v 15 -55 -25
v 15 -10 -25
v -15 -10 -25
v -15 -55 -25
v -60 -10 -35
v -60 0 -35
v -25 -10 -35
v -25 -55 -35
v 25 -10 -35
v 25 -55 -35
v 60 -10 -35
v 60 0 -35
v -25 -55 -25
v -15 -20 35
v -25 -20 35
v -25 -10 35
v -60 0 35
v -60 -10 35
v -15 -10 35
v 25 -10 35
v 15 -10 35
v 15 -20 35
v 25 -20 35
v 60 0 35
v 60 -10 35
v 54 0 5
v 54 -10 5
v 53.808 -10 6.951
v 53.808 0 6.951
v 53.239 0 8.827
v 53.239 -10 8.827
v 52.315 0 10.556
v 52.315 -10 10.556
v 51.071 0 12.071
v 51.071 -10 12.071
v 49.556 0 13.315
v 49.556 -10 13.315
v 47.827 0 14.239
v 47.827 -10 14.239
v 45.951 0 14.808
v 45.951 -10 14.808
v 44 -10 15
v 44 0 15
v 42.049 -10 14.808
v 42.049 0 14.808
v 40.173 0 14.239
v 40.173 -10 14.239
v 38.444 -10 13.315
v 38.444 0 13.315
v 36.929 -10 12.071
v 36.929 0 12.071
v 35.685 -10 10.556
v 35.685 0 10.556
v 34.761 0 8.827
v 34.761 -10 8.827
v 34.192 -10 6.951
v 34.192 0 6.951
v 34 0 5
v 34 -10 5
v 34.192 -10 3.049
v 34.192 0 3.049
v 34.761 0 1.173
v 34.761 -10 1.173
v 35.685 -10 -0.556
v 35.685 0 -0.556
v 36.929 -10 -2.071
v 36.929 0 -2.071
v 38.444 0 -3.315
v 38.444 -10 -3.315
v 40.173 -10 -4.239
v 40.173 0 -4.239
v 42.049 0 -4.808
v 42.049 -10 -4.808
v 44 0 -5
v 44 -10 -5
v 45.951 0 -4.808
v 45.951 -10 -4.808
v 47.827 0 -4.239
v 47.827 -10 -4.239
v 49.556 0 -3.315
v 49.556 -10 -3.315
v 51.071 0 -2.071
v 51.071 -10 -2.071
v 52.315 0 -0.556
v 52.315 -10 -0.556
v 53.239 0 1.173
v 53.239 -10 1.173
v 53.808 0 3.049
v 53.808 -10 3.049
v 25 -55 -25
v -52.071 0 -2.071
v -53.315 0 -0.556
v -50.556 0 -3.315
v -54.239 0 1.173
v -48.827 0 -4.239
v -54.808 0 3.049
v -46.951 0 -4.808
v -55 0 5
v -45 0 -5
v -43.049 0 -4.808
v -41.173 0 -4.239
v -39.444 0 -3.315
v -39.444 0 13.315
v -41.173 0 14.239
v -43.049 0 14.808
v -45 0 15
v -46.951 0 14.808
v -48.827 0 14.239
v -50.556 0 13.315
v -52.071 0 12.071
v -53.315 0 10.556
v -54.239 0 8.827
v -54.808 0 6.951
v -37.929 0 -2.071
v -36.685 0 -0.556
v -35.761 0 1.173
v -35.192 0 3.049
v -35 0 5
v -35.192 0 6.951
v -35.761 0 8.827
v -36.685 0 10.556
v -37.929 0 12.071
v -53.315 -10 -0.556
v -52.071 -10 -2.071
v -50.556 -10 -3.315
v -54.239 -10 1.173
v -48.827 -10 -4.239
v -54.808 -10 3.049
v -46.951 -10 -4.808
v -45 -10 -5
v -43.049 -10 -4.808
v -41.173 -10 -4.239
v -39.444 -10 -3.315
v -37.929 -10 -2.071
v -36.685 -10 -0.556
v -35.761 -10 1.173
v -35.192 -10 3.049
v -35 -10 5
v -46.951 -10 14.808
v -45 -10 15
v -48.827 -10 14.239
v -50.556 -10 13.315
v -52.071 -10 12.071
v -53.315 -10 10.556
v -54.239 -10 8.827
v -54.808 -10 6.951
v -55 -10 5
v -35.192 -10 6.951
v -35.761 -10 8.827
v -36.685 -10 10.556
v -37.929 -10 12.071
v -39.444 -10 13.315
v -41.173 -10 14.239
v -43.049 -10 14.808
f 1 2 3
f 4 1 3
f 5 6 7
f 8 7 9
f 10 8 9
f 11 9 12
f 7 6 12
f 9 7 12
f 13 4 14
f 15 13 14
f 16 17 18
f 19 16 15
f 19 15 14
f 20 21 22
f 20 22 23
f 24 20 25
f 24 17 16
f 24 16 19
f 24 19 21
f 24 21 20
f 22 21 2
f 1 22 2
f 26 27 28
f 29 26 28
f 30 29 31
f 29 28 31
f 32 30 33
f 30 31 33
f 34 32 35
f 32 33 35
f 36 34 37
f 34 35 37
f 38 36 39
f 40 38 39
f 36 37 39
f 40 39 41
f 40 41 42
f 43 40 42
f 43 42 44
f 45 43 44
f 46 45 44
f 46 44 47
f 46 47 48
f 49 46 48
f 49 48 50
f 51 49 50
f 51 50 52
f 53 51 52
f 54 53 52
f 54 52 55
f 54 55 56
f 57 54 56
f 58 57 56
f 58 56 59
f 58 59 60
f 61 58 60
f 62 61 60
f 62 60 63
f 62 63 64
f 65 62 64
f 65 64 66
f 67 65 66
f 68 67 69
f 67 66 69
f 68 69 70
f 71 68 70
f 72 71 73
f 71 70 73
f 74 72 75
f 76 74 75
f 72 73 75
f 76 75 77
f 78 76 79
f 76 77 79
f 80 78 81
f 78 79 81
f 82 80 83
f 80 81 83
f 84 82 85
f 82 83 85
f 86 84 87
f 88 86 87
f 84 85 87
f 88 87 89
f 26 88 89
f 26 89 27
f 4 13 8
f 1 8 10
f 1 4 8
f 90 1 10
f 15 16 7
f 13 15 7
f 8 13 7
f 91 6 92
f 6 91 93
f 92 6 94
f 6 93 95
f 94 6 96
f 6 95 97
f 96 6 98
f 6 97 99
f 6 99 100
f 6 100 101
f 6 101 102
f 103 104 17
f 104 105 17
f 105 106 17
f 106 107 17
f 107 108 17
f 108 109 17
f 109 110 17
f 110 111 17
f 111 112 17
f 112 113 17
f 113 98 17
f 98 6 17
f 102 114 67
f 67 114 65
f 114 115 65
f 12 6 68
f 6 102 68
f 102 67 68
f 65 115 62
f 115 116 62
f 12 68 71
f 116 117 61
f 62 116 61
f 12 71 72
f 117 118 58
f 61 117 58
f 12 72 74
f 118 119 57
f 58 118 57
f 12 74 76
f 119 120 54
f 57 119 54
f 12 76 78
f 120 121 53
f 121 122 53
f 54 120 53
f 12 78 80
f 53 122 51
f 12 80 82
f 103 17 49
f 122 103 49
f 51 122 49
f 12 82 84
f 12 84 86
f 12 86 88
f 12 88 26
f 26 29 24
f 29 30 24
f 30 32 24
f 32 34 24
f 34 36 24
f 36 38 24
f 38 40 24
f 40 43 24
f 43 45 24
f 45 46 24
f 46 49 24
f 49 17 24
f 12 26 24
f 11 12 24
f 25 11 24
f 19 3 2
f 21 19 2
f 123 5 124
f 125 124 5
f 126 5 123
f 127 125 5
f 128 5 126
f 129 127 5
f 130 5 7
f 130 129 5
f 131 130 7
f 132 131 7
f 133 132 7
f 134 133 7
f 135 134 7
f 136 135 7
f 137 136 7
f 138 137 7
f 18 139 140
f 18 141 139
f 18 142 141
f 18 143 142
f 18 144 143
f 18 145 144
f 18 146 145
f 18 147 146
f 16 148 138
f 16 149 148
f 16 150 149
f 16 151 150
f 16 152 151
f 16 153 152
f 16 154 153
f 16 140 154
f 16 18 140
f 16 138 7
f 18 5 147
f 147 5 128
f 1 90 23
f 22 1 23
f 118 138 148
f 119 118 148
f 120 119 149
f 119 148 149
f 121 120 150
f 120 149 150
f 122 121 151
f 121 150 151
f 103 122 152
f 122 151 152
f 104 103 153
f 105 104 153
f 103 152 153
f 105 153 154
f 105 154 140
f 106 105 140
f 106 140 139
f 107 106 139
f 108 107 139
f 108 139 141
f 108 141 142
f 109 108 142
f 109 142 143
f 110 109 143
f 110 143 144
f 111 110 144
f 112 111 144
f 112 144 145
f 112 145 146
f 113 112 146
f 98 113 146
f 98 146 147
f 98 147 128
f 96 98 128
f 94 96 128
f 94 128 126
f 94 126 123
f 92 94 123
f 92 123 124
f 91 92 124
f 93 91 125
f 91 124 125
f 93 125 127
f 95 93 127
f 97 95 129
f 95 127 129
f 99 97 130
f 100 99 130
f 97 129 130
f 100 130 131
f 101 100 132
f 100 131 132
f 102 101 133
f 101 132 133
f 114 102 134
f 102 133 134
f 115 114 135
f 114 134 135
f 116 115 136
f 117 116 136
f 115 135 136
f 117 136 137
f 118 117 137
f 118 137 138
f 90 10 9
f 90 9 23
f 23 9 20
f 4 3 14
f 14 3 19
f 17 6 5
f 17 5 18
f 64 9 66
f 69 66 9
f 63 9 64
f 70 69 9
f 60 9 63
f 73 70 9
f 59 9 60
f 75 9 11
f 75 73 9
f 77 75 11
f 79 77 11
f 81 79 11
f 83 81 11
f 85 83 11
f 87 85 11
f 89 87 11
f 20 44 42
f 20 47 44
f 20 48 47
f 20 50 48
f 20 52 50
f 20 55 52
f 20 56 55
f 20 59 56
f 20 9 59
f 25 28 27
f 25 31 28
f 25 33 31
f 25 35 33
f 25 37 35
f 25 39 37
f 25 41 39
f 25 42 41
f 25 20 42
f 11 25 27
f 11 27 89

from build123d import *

# Parameters (mm, degrees)
F0_W     = 120
F0_H     = 70
F1_DEPTH = 10
F2_R     = 10
F3_DEPTH = 10.001
F4_DEPTH = 45
F6_DEPTH = 50


with BuildPart() as f1:
    # F0 (on Front) → F1 (new body)
    with BuildSketch(Plane.XZ):
        Rectangle(F0_W, F0_H)
    extrude(amount=F1_DEPTH)

    # F2 (on face) → F3 (cut, through all)
    with BuildSketch(Plane.XZ.offset(10)):
        with Locations((-45, 5)):
            Circle(F2_R)
        with Locations((44, 5)):
            Circle(F2_R)
    extrude(amount=-F3_DEPTH, mode=Mode.SUBTRACT)

    # F2 (on face) → F4 (join)
    with BuildSketch(Plane.XZ.offset(10)):
        Polygon((-15, 35), (-25, 35), (-25, -25), (-25, -35), (-15, -35), (15, -35), (25, -35), (25, -25), (25, 35), (15, 35), (15, -25), (-15, -25), align=None)
    extrude(amount=F4_DEPTH)

    # F5 (on face) → F6 (cut, through all)
    with BuildSketch(Plane.YZ.offset(25)):
        Polygon((-55, -25), (-20, 35), (-55, 35), align=None)
    extrude(amount=-F6_DEPTH, mode=Mode.SUBTRACT)


solid = f1.part
